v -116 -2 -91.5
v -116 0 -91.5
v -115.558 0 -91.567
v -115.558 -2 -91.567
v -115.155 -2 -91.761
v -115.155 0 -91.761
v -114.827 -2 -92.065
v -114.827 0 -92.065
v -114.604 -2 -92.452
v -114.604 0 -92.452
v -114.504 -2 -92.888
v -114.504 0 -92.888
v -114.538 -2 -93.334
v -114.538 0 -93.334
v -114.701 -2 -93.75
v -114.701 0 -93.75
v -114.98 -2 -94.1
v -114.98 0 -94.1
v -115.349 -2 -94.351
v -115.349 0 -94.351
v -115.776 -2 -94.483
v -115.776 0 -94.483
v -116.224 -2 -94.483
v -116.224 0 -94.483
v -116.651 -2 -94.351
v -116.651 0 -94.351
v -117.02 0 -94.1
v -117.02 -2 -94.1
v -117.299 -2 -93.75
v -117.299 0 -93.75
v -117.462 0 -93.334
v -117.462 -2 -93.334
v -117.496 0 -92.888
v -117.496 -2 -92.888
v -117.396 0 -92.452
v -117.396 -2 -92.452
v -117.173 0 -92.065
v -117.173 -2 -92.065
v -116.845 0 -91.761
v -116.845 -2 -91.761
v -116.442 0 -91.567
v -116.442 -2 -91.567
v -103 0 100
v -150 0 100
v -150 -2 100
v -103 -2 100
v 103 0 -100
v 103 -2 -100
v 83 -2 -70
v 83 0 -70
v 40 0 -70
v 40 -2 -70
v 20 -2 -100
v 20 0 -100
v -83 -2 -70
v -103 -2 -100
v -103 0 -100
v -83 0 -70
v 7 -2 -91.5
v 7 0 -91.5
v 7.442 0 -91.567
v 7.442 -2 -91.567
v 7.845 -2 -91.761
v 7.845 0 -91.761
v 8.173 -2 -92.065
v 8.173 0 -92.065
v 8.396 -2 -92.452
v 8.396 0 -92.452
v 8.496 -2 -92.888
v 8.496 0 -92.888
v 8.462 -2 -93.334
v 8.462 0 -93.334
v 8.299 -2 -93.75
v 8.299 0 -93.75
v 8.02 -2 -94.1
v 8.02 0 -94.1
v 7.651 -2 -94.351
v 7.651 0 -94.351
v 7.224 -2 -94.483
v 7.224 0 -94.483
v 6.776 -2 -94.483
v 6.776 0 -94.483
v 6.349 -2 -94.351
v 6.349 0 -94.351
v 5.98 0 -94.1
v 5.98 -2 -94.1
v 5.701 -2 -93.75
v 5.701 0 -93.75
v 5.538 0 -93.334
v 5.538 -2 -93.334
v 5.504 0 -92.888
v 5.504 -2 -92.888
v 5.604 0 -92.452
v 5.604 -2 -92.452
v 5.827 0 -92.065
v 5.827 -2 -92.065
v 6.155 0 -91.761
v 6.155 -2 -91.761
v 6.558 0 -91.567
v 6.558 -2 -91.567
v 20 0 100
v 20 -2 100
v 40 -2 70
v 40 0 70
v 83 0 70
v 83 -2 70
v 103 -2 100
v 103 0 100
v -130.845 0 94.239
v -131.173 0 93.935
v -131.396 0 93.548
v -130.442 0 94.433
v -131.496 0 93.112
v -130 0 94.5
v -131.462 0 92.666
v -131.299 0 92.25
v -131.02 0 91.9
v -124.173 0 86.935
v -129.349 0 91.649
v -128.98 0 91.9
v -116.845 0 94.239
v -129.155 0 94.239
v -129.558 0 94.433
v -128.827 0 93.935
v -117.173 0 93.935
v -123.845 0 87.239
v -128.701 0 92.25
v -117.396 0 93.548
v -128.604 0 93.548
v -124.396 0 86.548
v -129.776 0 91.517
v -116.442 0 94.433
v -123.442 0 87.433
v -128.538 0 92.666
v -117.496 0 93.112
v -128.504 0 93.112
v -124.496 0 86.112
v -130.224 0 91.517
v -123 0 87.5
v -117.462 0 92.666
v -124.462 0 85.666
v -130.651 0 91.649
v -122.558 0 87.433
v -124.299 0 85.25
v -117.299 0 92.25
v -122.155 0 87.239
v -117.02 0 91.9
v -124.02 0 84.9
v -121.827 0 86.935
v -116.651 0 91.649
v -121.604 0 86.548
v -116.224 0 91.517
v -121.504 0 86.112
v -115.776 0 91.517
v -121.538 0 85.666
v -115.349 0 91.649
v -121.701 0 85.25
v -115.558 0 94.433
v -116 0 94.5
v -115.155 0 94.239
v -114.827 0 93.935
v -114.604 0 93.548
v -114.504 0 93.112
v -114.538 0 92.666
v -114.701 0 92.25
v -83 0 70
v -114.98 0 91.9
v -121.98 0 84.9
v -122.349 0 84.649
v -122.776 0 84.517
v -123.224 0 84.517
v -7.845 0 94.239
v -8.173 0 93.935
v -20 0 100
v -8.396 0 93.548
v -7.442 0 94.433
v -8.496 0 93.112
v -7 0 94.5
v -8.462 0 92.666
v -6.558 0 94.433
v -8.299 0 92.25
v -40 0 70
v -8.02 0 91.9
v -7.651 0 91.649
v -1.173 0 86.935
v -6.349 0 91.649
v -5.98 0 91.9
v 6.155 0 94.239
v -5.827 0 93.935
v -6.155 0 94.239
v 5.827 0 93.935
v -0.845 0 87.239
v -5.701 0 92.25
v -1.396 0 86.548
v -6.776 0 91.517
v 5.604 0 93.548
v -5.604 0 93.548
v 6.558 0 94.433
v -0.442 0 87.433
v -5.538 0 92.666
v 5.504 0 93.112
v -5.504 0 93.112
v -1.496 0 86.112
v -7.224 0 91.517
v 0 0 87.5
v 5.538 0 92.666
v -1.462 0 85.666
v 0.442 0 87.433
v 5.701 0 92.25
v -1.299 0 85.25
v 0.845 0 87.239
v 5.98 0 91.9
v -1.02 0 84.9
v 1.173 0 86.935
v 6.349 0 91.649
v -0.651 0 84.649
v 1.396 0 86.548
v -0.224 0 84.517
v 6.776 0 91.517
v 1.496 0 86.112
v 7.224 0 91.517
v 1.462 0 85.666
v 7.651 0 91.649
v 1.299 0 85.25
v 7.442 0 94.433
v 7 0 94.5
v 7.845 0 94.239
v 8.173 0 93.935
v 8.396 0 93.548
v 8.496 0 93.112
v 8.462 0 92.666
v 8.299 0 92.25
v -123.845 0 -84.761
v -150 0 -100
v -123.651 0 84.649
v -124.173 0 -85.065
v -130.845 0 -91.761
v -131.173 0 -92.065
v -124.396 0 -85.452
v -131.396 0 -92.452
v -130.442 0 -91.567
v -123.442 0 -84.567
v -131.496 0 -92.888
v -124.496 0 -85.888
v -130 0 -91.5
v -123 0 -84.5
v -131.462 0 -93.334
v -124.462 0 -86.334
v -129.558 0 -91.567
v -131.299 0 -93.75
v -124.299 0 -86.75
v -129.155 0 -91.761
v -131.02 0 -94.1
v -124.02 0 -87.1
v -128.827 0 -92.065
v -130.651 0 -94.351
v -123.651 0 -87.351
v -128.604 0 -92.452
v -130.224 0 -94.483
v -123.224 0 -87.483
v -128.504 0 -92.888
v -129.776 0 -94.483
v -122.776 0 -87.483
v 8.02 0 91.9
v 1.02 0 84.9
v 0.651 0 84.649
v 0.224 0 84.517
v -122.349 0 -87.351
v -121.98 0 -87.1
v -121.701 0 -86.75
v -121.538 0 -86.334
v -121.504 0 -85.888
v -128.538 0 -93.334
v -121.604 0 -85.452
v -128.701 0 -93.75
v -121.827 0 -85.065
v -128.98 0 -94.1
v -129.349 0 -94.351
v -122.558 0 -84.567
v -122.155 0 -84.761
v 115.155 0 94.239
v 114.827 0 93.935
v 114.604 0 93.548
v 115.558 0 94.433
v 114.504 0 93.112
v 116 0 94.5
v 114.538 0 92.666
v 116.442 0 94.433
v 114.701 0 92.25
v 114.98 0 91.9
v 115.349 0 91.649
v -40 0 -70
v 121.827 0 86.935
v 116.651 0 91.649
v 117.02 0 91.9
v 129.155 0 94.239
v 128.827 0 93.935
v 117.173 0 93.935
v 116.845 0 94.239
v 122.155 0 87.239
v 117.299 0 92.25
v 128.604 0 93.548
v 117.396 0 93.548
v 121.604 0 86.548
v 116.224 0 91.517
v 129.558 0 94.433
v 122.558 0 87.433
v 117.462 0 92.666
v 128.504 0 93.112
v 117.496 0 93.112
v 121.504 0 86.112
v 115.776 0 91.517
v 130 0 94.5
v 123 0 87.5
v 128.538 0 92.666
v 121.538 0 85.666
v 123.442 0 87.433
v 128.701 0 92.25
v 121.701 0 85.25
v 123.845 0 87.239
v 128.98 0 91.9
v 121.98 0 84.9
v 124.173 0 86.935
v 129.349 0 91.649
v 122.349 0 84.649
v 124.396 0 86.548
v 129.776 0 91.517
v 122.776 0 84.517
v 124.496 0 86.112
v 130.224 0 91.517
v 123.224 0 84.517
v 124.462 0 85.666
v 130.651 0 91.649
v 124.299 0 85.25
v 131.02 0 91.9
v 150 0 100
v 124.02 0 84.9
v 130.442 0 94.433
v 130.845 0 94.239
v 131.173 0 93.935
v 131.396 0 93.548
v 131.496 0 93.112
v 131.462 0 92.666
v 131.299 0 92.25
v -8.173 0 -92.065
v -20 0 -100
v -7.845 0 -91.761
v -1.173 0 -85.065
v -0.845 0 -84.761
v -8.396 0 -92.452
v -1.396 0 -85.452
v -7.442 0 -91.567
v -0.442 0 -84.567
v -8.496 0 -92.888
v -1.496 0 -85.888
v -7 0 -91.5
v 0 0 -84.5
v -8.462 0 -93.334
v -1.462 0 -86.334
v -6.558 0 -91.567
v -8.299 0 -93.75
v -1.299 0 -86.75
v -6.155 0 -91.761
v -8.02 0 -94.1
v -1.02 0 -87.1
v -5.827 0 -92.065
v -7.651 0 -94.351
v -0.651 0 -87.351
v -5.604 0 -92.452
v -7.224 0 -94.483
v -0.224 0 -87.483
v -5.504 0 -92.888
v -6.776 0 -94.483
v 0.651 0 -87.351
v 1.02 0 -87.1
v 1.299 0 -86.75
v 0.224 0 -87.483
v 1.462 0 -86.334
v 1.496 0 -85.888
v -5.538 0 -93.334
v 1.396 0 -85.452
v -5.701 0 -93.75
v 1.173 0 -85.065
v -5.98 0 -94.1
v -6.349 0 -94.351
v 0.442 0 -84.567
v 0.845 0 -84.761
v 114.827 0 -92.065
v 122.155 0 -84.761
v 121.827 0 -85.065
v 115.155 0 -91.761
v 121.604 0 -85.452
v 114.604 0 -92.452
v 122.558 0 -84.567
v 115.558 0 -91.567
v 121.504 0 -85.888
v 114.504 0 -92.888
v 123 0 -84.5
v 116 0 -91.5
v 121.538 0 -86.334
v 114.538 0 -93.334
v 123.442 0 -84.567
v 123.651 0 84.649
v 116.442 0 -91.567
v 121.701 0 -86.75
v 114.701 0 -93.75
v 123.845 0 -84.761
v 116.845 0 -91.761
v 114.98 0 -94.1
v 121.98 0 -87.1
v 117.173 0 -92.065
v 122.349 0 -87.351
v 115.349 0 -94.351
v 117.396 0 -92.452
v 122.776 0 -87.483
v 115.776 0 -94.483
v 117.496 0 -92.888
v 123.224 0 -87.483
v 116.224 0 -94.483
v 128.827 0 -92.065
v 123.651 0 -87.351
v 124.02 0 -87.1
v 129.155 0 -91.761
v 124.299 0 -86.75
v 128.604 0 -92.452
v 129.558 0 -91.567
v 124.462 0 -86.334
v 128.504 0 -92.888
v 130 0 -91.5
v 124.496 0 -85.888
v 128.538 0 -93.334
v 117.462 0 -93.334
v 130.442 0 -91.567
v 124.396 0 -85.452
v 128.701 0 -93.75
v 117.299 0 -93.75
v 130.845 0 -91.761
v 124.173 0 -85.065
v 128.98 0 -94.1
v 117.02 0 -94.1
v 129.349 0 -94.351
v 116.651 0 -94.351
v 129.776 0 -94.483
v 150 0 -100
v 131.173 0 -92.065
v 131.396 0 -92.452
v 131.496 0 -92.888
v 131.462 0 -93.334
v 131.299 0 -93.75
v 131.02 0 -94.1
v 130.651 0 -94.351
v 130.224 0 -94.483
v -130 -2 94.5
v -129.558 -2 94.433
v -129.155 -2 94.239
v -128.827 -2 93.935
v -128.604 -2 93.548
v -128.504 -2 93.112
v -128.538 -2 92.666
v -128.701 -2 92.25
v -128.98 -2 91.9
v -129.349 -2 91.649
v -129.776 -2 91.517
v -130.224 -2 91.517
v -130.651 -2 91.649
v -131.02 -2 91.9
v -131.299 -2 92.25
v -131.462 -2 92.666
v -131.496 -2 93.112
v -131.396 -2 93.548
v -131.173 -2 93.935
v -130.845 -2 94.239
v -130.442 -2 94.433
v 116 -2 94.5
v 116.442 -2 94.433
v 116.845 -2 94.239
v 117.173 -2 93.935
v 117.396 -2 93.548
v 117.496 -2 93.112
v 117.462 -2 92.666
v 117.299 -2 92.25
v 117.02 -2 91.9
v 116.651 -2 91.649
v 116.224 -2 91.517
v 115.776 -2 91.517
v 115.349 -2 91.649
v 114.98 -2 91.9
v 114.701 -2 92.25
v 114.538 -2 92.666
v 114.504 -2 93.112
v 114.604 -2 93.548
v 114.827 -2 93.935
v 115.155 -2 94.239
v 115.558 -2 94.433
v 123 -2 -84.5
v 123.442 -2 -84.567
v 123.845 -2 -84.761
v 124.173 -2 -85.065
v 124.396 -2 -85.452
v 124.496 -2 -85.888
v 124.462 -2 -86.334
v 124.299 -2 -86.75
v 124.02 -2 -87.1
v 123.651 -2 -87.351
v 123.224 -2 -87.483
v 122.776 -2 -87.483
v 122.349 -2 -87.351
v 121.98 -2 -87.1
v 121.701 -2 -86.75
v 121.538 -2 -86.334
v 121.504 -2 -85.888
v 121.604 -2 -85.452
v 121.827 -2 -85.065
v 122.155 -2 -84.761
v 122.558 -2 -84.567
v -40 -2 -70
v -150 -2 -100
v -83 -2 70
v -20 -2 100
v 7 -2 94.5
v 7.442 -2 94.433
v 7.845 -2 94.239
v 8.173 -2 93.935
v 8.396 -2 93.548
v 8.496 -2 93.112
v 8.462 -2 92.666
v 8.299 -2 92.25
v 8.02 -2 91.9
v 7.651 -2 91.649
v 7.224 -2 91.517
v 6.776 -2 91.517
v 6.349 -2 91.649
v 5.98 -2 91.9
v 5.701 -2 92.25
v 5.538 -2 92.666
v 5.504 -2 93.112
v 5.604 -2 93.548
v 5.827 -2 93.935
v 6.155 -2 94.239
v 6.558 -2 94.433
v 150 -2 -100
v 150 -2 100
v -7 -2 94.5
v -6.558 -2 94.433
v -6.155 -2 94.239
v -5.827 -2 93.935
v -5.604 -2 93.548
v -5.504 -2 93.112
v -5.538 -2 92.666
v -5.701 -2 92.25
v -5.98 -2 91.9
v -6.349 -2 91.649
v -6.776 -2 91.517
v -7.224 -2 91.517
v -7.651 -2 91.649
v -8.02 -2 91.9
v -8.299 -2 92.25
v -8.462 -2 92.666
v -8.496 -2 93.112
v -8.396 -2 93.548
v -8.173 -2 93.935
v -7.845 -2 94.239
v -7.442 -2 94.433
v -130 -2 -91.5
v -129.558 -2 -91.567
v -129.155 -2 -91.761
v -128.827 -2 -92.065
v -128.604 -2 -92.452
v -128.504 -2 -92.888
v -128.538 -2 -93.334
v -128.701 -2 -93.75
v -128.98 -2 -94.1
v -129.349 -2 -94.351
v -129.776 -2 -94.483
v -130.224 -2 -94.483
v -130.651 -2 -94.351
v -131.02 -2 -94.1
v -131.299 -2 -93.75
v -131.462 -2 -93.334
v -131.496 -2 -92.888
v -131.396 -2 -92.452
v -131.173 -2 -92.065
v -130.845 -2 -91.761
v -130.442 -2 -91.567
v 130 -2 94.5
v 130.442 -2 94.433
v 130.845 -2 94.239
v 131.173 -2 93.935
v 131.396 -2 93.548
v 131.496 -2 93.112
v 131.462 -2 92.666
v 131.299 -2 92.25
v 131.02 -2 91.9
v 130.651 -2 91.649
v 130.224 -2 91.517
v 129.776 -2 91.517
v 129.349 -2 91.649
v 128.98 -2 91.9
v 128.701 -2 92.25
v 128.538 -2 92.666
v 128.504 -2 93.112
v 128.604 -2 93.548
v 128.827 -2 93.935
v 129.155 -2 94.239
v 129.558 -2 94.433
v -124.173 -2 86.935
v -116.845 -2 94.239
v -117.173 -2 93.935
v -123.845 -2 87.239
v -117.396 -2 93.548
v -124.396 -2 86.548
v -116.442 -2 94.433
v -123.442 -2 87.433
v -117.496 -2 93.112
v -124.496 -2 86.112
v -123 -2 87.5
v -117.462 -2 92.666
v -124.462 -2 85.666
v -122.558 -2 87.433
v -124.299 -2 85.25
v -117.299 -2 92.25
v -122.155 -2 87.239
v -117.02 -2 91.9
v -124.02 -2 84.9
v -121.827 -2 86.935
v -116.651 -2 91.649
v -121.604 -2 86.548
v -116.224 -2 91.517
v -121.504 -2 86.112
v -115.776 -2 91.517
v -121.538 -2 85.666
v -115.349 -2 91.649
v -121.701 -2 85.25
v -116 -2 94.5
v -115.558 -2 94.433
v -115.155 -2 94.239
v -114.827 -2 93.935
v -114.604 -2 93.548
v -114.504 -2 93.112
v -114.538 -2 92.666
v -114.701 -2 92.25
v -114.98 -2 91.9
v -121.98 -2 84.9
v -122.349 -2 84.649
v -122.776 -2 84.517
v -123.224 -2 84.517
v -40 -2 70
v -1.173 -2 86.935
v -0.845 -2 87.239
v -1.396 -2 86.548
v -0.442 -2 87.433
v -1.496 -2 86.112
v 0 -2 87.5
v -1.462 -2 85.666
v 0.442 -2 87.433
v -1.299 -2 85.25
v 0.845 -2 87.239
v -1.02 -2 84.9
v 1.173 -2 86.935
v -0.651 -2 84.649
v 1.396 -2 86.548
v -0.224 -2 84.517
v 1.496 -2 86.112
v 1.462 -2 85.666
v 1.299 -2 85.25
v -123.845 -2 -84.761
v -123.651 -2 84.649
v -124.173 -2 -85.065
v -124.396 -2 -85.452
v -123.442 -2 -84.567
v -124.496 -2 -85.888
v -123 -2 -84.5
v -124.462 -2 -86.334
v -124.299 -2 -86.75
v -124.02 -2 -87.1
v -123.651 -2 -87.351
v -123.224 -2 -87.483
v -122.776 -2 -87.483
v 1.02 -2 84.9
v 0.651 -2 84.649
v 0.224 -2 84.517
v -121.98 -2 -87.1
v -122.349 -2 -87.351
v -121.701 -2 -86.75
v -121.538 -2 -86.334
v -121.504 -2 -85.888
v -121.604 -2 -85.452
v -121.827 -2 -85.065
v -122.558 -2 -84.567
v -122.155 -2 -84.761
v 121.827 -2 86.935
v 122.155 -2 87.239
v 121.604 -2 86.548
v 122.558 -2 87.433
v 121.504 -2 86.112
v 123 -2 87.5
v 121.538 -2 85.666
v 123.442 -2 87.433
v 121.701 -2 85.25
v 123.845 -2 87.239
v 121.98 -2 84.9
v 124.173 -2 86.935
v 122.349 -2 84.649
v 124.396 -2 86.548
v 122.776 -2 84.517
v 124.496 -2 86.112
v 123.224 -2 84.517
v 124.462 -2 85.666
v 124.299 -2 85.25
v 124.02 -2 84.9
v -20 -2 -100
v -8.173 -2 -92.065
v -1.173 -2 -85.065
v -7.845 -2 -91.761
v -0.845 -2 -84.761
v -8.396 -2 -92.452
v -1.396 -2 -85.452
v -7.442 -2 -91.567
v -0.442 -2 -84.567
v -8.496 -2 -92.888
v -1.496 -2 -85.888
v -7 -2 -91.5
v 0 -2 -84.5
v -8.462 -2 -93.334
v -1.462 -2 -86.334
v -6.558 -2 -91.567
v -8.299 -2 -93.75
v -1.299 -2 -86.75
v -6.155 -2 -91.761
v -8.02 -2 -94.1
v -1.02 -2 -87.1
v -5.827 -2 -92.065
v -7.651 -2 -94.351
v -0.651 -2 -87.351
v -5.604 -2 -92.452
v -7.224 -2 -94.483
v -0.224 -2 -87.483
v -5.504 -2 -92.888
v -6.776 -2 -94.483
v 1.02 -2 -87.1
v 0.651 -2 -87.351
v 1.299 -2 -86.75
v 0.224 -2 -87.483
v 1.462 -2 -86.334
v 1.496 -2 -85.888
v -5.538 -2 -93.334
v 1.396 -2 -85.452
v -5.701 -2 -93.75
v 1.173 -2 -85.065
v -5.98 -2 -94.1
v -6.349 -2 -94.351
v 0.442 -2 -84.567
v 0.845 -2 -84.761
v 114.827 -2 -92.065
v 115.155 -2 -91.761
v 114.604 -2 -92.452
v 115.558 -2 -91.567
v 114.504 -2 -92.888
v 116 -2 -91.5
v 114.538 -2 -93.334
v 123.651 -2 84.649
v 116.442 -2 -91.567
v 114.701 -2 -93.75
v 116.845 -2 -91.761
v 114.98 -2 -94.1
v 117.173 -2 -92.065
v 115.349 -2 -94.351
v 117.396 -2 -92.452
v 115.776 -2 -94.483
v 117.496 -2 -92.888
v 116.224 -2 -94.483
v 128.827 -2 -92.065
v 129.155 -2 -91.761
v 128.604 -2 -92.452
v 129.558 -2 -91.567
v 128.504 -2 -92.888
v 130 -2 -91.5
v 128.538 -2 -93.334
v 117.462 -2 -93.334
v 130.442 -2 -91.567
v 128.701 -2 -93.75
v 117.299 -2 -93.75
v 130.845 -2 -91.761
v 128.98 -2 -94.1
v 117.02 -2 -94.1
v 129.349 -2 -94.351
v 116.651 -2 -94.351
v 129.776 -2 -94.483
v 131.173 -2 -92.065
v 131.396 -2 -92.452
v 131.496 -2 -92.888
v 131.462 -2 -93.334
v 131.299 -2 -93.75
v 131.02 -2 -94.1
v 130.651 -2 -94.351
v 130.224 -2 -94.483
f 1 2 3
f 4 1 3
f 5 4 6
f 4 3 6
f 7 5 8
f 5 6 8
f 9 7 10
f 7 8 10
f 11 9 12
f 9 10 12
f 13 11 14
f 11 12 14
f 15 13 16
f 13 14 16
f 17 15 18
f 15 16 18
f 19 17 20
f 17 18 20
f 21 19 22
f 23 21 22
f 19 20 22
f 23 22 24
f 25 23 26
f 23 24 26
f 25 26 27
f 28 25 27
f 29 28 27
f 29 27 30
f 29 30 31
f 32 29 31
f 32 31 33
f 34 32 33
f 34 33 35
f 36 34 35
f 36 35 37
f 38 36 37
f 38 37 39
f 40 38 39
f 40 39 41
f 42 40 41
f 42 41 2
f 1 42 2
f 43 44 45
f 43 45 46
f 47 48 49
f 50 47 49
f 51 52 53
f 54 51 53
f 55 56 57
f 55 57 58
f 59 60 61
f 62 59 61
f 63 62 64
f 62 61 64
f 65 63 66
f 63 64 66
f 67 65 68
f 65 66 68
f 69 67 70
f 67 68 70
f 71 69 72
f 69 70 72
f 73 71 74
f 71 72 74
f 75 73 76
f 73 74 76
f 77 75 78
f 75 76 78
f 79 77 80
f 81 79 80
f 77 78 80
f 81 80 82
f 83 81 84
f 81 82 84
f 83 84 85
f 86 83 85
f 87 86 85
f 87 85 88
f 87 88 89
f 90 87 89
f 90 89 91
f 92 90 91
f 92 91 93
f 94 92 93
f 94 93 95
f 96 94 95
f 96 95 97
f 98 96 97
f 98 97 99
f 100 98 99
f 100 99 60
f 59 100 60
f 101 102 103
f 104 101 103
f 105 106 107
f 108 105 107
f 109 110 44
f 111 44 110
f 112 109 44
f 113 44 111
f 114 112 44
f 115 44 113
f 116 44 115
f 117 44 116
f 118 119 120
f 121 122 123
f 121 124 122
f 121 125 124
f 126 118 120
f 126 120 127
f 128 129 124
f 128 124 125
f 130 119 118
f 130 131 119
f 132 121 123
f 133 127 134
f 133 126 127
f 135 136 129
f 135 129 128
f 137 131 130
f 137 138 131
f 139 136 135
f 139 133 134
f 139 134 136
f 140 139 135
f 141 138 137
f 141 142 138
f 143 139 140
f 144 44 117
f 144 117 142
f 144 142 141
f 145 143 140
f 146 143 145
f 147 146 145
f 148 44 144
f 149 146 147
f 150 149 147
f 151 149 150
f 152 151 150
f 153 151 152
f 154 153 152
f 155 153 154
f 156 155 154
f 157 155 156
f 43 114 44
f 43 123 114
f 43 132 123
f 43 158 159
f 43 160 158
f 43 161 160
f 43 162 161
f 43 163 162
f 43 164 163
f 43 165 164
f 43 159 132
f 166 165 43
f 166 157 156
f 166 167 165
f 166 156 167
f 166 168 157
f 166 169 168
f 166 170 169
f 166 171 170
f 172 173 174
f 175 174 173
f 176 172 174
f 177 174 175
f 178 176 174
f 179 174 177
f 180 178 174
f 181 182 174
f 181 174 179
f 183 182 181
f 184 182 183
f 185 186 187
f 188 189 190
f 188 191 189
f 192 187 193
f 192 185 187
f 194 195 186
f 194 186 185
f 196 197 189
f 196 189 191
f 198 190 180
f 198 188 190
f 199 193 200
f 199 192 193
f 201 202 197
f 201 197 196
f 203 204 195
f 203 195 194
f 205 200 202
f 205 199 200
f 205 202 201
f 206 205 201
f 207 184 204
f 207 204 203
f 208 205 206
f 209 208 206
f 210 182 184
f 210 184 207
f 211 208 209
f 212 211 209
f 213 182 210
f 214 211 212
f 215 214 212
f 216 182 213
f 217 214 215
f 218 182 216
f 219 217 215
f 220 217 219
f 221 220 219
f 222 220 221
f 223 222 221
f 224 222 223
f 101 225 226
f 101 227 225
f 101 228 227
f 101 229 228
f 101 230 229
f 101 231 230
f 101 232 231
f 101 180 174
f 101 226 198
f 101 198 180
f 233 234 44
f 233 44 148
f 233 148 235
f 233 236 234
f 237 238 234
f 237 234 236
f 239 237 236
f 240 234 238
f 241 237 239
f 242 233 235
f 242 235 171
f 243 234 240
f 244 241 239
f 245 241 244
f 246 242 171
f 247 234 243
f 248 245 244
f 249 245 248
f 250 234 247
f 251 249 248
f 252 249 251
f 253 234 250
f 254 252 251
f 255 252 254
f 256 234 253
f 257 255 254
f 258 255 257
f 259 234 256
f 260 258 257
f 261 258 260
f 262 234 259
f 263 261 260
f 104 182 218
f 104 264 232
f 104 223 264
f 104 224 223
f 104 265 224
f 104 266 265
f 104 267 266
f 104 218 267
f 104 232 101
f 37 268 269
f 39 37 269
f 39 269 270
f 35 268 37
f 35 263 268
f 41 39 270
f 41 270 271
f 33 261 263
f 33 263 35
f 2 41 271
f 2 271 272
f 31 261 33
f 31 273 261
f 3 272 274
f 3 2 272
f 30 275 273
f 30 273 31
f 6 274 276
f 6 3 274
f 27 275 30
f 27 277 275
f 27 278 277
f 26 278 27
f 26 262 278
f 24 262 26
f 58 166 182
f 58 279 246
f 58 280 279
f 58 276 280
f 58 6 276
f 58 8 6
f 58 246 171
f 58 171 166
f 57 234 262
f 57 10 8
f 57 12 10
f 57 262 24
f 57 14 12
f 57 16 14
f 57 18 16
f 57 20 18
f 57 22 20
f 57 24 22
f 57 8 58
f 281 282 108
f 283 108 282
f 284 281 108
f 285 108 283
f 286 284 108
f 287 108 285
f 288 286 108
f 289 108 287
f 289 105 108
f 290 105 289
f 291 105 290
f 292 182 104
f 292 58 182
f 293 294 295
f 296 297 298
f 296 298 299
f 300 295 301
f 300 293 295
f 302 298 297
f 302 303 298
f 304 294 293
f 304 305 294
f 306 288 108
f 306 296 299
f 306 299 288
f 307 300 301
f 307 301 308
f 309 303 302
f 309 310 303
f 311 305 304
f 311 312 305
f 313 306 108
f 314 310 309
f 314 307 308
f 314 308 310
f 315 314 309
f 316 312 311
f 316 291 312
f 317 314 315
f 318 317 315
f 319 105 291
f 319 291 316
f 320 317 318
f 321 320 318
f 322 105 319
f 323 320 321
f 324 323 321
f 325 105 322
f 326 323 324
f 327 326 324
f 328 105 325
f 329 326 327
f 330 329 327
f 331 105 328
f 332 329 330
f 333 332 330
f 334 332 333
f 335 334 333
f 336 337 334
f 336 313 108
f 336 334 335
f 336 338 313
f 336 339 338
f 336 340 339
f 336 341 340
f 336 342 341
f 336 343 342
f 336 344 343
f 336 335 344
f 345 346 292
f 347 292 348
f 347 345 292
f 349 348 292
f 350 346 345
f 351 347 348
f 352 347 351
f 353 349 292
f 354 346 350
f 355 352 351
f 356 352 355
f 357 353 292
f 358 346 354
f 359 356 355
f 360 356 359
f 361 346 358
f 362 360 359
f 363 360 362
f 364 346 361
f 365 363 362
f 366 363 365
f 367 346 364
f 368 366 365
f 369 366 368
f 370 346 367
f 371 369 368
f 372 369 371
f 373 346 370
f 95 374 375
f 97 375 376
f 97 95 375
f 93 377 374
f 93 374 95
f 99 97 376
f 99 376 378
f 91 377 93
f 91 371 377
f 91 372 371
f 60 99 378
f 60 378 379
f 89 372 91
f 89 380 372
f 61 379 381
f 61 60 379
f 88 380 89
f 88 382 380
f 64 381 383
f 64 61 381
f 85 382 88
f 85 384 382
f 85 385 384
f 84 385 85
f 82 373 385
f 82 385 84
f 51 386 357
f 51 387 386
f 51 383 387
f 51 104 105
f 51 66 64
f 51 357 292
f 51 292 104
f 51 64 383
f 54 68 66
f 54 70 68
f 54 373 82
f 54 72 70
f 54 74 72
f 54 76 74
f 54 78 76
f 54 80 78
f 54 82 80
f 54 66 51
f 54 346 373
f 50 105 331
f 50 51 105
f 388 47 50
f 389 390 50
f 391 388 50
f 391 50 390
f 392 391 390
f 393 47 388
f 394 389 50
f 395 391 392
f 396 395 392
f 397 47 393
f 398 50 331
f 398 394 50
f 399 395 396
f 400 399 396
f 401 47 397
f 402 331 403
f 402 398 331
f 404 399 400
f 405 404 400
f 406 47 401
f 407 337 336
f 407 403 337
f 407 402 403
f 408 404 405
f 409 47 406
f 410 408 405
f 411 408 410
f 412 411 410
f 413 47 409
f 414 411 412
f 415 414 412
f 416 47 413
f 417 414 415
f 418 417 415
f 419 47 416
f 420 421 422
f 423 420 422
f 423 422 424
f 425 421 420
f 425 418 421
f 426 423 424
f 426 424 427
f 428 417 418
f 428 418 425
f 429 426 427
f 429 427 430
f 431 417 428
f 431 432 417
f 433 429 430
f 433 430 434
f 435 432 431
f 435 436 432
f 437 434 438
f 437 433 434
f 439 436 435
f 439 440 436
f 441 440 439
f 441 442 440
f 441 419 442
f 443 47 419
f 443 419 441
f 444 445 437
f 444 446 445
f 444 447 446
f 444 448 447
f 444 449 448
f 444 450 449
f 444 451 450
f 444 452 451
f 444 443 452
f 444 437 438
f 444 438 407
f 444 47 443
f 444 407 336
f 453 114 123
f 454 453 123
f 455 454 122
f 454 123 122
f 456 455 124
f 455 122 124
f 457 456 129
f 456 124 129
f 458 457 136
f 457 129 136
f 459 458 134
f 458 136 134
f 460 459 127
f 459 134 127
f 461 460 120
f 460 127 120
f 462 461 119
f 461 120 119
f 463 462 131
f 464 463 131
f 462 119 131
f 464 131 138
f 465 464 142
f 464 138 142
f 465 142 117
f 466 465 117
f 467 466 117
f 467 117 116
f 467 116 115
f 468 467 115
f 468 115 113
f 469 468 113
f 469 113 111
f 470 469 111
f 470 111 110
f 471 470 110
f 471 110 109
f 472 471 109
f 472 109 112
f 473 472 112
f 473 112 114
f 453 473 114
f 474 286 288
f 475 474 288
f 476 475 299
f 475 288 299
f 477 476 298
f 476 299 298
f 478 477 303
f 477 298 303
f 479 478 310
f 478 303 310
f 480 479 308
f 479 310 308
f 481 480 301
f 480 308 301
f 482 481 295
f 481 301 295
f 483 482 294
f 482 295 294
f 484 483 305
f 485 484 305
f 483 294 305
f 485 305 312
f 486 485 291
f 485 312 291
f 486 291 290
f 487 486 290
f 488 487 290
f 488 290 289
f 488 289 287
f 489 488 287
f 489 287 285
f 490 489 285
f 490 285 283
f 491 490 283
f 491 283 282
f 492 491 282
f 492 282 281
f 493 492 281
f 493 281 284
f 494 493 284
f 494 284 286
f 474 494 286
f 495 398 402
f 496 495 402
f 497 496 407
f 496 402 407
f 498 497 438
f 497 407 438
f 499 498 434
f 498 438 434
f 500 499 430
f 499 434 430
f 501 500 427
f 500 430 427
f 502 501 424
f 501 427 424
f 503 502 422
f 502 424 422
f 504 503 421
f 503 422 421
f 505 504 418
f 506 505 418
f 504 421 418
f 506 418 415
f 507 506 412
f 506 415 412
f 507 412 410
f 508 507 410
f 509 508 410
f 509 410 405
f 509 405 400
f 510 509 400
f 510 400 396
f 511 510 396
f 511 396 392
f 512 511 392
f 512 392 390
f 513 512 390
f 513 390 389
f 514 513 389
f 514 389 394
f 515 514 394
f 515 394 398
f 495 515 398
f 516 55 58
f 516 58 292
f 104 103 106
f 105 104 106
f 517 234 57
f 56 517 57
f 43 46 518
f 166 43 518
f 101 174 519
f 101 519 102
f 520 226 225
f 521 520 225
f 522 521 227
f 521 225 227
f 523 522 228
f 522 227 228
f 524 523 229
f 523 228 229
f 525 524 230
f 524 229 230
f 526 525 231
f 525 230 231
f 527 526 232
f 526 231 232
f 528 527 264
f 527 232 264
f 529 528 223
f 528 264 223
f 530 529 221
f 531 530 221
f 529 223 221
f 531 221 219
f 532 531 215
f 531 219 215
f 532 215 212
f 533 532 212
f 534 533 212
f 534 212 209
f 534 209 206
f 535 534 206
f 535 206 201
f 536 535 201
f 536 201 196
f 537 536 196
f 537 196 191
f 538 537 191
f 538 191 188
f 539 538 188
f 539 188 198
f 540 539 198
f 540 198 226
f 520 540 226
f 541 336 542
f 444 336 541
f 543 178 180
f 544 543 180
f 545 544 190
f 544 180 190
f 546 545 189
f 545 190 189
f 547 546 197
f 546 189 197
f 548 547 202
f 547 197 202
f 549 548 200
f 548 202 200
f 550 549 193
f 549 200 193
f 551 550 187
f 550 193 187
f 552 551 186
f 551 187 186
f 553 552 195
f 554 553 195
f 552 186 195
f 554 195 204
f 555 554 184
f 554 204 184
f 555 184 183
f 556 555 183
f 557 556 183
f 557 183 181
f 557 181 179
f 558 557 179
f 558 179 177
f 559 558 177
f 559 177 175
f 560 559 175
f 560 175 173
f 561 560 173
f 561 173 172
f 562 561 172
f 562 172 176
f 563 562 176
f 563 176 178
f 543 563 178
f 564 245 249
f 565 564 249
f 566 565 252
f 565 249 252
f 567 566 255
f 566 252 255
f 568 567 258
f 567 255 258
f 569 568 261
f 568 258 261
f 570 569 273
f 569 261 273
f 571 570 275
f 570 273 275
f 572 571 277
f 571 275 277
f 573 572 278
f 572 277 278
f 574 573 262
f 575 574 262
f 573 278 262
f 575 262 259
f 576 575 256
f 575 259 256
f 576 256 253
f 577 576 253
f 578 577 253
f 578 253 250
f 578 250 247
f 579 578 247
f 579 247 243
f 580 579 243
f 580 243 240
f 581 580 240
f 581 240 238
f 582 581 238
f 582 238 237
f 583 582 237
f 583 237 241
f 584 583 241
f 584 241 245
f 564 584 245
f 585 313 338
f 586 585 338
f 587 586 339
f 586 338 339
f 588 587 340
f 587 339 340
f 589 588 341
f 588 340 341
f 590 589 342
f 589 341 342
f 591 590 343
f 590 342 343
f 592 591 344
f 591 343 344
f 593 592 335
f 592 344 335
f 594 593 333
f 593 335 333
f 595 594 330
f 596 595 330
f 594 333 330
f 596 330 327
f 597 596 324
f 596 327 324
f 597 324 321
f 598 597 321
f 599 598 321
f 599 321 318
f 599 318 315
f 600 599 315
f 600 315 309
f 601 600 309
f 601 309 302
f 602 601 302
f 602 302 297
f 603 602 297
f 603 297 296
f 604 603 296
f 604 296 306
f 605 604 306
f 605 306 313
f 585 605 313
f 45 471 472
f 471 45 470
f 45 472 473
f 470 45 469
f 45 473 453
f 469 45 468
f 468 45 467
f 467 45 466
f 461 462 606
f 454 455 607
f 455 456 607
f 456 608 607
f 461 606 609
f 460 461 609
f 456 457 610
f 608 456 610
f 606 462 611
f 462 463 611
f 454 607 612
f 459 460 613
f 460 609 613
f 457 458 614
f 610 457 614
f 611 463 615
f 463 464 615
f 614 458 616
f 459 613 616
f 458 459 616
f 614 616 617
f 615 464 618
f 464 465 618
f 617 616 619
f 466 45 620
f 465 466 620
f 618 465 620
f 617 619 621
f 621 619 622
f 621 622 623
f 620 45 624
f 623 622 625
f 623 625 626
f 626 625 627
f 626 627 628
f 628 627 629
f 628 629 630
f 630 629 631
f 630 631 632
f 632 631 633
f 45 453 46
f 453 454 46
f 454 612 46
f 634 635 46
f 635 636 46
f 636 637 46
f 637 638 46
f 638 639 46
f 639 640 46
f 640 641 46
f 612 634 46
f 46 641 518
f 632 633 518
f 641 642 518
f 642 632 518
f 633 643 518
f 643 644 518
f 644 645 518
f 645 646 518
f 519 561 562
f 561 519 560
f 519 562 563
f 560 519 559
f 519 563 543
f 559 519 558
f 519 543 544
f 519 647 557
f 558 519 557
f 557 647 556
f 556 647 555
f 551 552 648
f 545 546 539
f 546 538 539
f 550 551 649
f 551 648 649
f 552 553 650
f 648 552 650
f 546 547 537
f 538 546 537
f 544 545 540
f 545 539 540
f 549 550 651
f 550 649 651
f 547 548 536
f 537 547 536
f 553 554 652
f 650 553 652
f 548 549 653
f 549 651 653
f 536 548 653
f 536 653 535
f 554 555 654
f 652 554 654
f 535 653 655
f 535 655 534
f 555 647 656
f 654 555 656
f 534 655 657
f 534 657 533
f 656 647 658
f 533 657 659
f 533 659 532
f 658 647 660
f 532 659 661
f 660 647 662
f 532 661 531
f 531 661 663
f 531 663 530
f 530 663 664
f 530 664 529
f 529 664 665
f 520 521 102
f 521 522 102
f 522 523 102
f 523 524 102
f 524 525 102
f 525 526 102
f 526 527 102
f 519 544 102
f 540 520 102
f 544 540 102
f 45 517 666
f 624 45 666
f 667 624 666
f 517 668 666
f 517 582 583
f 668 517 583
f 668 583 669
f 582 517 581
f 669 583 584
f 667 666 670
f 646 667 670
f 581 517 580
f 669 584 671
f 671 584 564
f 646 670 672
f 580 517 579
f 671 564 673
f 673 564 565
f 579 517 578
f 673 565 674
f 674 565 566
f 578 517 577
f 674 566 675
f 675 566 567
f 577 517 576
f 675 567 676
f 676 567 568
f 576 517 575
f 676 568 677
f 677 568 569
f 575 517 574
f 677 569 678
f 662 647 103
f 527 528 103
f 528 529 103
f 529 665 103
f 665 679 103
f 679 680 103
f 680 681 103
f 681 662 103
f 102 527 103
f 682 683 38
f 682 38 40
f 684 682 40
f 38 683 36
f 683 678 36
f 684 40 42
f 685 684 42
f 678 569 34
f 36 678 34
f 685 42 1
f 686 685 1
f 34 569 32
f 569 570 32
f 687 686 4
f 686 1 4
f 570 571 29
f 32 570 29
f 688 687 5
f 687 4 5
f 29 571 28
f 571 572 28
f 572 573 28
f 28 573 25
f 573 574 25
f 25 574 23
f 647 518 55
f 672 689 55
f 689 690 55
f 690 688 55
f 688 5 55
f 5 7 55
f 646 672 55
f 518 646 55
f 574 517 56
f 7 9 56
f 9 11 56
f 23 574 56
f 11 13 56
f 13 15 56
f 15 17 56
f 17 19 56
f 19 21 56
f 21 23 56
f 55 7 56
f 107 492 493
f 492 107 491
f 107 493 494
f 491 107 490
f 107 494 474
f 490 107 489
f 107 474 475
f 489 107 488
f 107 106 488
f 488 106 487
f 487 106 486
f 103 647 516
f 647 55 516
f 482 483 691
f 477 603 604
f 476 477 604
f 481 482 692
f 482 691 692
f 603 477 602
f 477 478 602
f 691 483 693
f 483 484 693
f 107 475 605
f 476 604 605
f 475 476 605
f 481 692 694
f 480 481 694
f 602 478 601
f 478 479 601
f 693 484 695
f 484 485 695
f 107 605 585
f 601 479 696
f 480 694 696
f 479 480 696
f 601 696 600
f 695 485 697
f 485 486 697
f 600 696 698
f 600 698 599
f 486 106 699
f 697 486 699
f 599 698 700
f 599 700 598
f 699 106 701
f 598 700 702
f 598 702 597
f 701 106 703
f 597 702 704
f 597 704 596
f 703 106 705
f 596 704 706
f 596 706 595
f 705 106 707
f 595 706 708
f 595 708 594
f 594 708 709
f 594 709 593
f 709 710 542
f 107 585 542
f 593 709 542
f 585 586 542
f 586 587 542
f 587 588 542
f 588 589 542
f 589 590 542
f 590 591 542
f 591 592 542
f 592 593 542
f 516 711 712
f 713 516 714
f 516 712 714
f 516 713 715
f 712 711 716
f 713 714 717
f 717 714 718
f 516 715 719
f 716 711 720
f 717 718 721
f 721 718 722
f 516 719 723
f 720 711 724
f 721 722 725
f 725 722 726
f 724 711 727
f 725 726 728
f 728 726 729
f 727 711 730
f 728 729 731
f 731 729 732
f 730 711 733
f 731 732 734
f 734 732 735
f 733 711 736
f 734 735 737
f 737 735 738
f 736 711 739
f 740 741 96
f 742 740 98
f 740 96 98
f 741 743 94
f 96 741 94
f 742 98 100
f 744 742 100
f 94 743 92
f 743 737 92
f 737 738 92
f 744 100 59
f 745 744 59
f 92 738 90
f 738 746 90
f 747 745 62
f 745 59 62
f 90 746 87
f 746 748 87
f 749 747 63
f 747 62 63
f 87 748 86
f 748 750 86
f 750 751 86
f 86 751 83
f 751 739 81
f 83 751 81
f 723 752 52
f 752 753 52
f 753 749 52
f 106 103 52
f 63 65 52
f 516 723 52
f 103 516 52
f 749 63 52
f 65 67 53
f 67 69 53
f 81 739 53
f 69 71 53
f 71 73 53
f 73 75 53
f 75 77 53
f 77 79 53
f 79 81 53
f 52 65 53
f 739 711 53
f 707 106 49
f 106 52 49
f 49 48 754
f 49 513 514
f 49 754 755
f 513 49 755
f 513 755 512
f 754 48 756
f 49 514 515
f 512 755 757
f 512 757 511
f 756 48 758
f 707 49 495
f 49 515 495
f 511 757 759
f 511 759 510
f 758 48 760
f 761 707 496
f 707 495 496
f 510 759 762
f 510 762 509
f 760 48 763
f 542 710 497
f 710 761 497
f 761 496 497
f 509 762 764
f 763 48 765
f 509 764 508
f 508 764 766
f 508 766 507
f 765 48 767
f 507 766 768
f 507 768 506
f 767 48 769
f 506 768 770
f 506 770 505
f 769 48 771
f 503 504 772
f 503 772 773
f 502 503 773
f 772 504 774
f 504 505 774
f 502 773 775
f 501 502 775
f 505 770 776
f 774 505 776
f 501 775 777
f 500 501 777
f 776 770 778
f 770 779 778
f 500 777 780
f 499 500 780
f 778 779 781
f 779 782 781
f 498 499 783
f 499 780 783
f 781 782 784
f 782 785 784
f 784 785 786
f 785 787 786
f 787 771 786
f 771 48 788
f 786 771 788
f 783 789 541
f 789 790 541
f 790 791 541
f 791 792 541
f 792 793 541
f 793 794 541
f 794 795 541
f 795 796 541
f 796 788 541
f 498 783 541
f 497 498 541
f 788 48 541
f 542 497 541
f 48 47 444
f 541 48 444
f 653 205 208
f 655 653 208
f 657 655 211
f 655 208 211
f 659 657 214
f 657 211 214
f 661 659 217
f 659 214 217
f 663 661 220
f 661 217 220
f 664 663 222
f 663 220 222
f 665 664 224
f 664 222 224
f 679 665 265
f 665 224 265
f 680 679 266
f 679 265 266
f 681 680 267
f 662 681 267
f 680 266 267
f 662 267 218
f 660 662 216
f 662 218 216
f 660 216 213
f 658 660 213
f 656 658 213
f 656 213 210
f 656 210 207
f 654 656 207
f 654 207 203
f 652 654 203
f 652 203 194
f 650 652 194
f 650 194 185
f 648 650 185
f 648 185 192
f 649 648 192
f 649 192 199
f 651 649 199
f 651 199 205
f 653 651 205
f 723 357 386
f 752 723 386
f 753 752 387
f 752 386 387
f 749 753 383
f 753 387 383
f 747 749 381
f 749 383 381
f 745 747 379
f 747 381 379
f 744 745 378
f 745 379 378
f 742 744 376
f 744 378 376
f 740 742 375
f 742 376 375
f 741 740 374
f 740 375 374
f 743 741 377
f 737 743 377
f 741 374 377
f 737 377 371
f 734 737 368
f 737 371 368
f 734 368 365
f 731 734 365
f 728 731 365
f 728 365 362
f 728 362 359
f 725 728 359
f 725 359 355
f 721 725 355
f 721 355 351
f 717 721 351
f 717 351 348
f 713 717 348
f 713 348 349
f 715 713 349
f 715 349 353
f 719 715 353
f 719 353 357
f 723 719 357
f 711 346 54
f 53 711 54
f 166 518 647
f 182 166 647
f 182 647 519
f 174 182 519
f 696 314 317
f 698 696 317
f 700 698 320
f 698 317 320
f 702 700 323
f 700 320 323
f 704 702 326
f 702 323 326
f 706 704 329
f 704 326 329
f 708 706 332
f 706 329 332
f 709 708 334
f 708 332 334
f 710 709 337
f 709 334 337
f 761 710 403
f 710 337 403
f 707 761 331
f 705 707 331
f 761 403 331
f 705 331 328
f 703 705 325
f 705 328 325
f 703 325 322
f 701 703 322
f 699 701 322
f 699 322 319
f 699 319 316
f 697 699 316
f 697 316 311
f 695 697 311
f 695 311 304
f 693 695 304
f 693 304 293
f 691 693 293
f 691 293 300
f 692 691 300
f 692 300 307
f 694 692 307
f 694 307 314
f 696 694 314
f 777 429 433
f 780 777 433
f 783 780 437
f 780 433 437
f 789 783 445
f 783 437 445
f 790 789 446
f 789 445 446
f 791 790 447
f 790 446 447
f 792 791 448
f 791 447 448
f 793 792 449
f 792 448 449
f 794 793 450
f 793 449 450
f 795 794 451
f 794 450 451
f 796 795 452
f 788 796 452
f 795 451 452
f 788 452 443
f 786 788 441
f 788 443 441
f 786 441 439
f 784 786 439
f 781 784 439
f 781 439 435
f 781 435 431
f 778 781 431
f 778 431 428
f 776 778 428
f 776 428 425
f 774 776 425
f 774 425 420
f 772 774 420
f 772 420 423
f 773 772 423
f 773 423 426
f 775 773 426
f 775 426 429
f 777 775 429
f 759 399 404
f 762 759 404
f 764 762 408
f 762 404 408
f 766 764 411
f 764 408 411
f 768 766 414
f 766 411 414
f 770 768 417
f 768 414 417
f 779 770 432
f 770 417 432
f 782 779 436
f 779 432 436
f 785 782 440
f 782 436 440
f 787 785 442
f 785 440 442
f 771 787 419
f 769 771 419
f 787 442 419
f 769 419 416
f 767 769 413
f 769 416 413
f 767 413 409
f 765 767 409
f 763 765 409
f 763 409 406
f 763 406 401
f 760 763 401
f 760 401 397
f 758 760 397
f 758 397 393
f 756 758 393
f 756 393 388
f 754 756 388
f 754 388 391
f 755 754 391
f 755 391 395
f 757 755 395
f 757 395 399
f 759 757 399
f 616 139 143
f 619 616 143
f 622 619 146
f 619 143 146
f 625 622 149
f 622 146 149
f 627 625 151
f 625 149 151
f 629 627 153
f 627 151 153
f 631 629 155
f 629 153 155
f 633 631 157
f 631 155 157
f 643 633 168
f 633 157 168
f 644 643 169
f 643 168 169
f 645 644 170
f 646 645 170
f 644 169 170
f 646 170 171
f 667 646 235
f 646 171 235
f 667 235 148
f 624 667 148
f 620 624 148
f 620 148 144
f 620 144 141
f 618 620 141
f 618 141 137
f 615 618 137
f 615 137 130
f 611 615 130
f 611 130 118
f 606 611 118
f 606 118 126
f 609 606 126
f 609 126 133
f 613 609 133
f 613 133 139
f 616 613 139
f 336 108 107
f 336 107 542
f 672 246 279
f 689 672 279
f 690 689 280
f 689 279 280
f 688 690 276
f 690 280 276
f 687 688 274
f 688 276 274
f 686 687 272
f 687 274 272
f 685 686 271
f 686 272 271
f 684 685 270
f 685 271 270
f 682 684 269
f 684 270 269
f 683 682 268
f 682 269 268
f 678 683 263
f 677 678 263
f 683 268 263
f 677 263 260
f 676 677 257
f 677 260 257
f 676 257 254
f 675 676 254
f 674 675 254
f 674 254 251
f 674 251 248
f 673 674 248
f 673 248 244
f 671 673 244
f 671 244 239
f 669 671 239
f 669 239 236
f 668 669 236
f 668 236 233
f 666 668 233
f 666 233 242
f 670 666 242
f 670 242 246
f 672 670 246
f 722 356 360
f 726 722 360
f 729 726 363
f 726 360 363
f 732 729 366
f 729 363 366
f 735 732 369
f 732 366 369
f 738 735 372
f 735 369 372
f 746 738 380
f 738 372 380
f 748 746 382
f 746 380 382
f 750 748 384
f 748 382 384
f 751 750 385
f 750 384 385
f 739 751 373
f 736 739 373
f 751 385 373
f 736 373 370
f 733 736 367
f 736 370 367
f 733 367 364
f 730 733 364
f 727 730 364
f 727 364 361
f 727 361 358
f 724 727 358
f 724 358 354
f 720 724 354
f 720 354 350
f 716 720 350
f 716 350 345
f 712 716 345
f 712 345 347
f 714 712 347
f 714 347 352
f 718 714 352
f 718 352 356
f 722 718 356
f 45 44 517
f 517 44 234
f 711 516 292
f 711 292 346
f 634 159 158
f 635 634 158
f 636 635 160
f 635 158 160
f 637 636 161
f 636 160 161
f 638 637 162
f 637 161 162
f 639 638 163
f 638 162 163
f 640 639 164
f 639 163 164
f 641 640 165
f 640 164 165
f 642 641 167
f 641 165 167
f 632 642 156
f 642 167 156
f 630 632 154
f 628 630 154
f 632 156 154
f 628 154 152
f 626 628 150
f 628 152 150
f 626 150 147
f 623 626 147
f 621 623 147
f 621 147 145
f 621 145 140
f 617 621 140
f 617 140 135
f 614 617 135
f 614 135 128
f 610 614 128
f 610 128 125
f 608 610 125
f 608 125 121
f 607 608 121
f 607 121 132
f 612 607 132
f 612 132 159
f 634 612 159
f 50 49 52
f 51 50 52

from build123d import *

# Parameters (mm, degrees)
SZKIC1_W                    = 300
SZKIC1_H                    = 200
DODANIE_WYCI_GNI_CIE1_DEPTH = 2
WYTNIJ_WYCI_GNI_CIE1_REACH  = 182.289
SZKIC2_R                    = 1.5
WYTNIJ_WYCI_GNI_CIE2_DEPTH  = 2


with BuildPart() as part:
    # Szkic1 → Dodanie-wyciągnięcie1 (new body)
    with BuildSketch(Plane(origin=(0, 0, 0), x_dir=(1, 0, 0), z_dir=(0, 1, 0))):
        Rectangle(SZKIC1_W, SZKIC1_H)
    extrude(amount=-DODANIE_WYCI_GNI_CIE1_DEPTH)

    # Szkic2 → Wytnij-wyciągnięcie1 (cut, up to next)
    with BuildSketch(Plane(origin=(0, 0, 0), x_dir=(1, 0, 0), z_dir=(0, 1, 0)), mode=Mode.PRIVATE) as wytnij_wyci_gni_cie1_sk1:
        with Locations(Location((0, -86, 0), (0, 0, 270))):
            Circle(SZKIC2_R)
    wytnij_wyci_gni_cie1_tool1 = extrude(wytnij_wyci_gni_cie1_sk1.sketch, amount=-WYTNIJ_WYCI_GNI_CIE1_REACH, mode=Mode.PRIVATE) & part.part
    # Szkic2 → Wytnij-wyciągnięcie1 (cut, up to next)
    with BuildSketch(Plane(origin=(0, 0, 0), x_dir=(1, 0, 0), z_dir=(0, 1, 0)), mode=Mode.PRIVATE) as wytnij_wyci_gni_cie1_sk2:
        with Locations(Location((-7, -93, 0), (0, 0, 270))):
            Circle(SZKIC2_R)
    wytnij_wyci_gni_cie1_tool2 = extrude(wytnij_wyci_gni_cie1_sk2.sketch, amount=-WYTNIJ_WYCI_GNI_CIE1_REACH, mode=Mode.PRIVATE) & part.part
    # Szkic2 → Wytnij-wyciągnięcie1 (cut, up to next)
    with BuildSketch(Plane(origin=(0, 0, 0), x_dir=(1, 0, 0), z_dir=(0, 1, 0)), mode=Mode.PRIVATE) as wytnij_wyci_gni_cie1_sk3:
        with Locations(Location((7, -93, 0), (0, 0, 270))):
            Circle(SZKIC2_R)
    wytnij_wyci_gni_cie1_tool3 = extrude(wytnij_wyci_gni_cie1_sk3.sketch, amount=-WYTNIJ_WYCI_GNI_CIE1_REACH, mode=Mode.PRIVATE) & part.part
    # Szkic2 → Wytnij-wyciągnięcie1 (cut, up to next)
    with BuildSketch(Plane(origin=(0, 0, 0), x_dir=(1, 0, 0), z_dir=(0, 1, 0)), mode=Mode.PRIVATE) as wytnij_wyci_gni_cie1_sk4:
        with Locations(Location((-123, -86, 0), (0, 0, 270))):
            Circle(SZKIC2_R)
    wytnij_wyci_gni_cie1_tool4 = extrude(wytnij_wyci_gni_cie1_sk4.sketch, amount=-WYTNIJ_WYCI_GNI_CIE1_REACH, mode=Mode.PRIVATE) & part.part
    # Szkic2 → Wytnij-wyciągnięcie1 (cut, up to next)
    with BuildSketch(Plane(origin=(0, 0, 0), x_dir=(1, 0, 0), z_dir=(0, 1, 0)), mode=Mode.PRIVATE) as wytnij_wyci_gni_cie1_sk5:
        with Locations(Location((-130, -93, 0), (0, 0, 270))):
            Circle(SZKIC2_R)
    wytnij_wyci_gni_cie1_tool5 = extrude(wytnij_wyci_gni_cie1_sk5.sketch, amount=-WYTNIJ_WYCI_GNI_CIE1_REACH, mode=Mode.PRIVATE) & part.part
    # Szkic2 → Wytnij-wyciągnięcie1 (cut, up to next)
    with BuildSketch(Plane(origin=(0, 0, 0), x_dir=(1, 0, 0), z_dir=(0, 1, 0)), mode=Mode.PRIVATE) as wytnij_wyci_gni_cie1_sk6:
        with Locations(Location((-116, -93, 0), (0, 0, 270))):
            Circle(SZKIC2_R)
    wytnij_wyci_gni_cie1_tool6 = extrude(wytnij_wyci_gni_cie1_sk6.sketch, amount=-WYTNIJ_WYCI_GNI_CIE1_REACH, mode=Mode.PRIVATE) & part.part
    # Szkic2 → Wytnij-wyciągnięcie1 (cut, up to next)
    with BuildSketch(Plane(origin=(0, 0, 0), x_dir=(1, 0, 0), z_dir=(0, 1, 0)), mode=Mode.PRIVATE) as wytnij_wyci_gni_cie1_sk7:
        with Locations(Location((130, -93, 0), (0, 0, 270))):
            Circle(SZKIC2_R)
    wytnij_wyci_gni_cie1_tool7 = extrude(wytnij_wyci_gni_cie1_sk7.sketch, amount=-WYTNIJ_WYCI_GNI_CIE1_REACH, mode=Mode.PRIVATE) & part.part
    # Szkic2 → Wytnij-wyciągnięcie1 (cut, up to next)
    with BuildSketch(Plane(origin=(0, 0, 0), x_dir=(1, 0, 0), z_dir=(0, 1, 0)), mode=Mode.PRIVATE) as wytnij_wyci_gni_cie1_sk8:
        with Locations(Location((123, -86, 0), (0, 0, 270))):
            Circle(SZKIC2_R)
    wytnij_wyci_gni_cie1_tool8 = extrude(wytnij_wyci_gni_cie1_sk8.sketch, amount=-WYTNIJ_WYCI_GNI_CIE1_REACH, mode=Mode.PRIVATE) & part.part
    # Szkic2 → Wytnij-wyciągnięcie1 (cut, up to next)
    with BuildSketch(Plane(origin=(0, 0, 0), x_dir=(1, 0, 0), z_dir=(0, 1, 0)), mode=Mode.PRIVATE) as wytnij_wyci_gni_cie1_sk9:
        with Locations(Location((116, -93, 0), (0, 0, 270))):
            Circle(SZKIC2_R)
    wytnij_wyci_gni_cie1_tool9 = extrude(wytnij_wyci_gni_cie1_sk9.sketch, amount=-WYTNIJ_WYCI_GNI_CIE1_REACH, mode=Mode.PRIVATE) & part.part
    # Szkic2 → Wytnij-wyciągnięcie1 (cut, up to next)
    with BuildSketch(Plane(origin=(0, 0, 0), x_dir=(1, 0, 0), z_dir=(0, 1, 0)), mode=Mode.PRIVATE) as wytnij_wyci_gni_cie1_sk10:
        with Locations(Location((0, 86, 0), (0, 0, 270))):
            Circle(SZKIC2_R)
    wytnij_wyci_gni_cie1_tool10 = extrude(wytnij_wyci_gni_cie1_sk10.sketch, amount=-WYTNIJ_WYCI_GNI_CIE1_REACH, mode=Mode.PRIVATE) & part.part
    # Szkic2 → Wytnij-wyciągnięcie1 (cut, up to next)
    with BuildSketch(Plane(origin=(0, 0, 0), x_dir=(1, 0, 0), z_dir=(0, 1, 0)), mode=Mode.PRIVATE) as wytnij_wyci_gni_cie1_sk11:
        with Locations(Location((7, 93, 0), (0, 0, 270))):
            Circle(SZKIC2_R)
    wytnij_wyci_gni_cie1_tool11 = extrude(wytnij_wyci_gni_cie1_sk11.sketch, amount=-WYTNIJ_WYCI_GNI_CIE1_REACH, mode=Mode.PRIVATE) & part.part
    # Szkic2 → Wytnij-wyciągnięcie1 (cut, up to next)
    with BuildSketch(Plane(origin=(0, 0, 0), x_dir=(1, 0, 0), z_dir=(0, 1, 0)), mode=Mode.PRIVATE) as wytnij_wyci_gni_cie1_sk12:
        with Locations(Location((-7, 93, 0), (0, 0, 270))):
            Circle(SZKIC2_R)
    wytnij_wyci_gni_cie1_tool12 = extrude(wytnij_wyci_gni_cie1_sk12.sketch, amount=-WYTNIJ_WYCI_GNI_CIE1_REACH, mode=Mode.PRIVATE) & part.part
    # Szkic2 → Wytnij-wyciągnięcie1 (cut, up to next)
    with BuildSketch(Plane(origin=(0, 0, 0), x_dir=(1, 0, 0), z_dir=(0, 1, 0)), mode=Mode.PRIVATE) as wytnij_wyci_gni_cie1_sk13:
        with Locations(Location((130, 93, 0), (0, 0, 270))):
            Circle(SZKIC2_R)
    wytnij_wyci_gni_cie1_tool13 = extrude(wytnij_wyci_gni_cie1_sk13.sketch, amount=-WYTNIJ_WYCI_GNI_CIE1_REACH, mode=Mode.PRIVATE) & part.part
    # Szkic2 → Wytnij-wyciągnięcie1 (cut, up to next)
    with BuildSketch(Plane(origin=(0, 0, 0), x_dir=(1, 0, 0), z_dir=(0, 1, 0)), mode=Mode.PRIVATE) as wytnij_wyci_gni_cie1_sk14:
        with Locations(Location((123, 86, 0), (0, 0, 270))):
            Circle(SZKIC2_R)
    wytnij_wyci_gni_cie1_tool14 = extrude(wytnij_wyci_gni_cie1_sk14.sketch, amount=-WYTNIJ_WYCI_GNI_CIE1_REACH, mode=Mode.PRIVATE) & part.part
    # Szkic2 → Wytnij-wyciągnięcie1 (cut, up to next)
    with BuildSketch(Plane(origin=(0, 0, 0), x_dir=(1, 0, 0), z_dir=(0, 1, 0)), mode=Mode.PRIVATE) as wytnij_wyci_gni_cie1_sk15:
        with Locations(Location((116, 93, 0), (0, 0, 270))):
            Circle(SZKIC2_R)
    wytnij_wyci_gni_cie1_tool15 = extrude(wytnij_wyci_gni_cie1_sk15.sketch, amount=-WYTNIJ_WYCI_GNI_CIE1_REACH, mode=Mode.PRIVATE) & part.part
    # Szkic2 → Wytnij-wyciągnięcie1 (cut, up to next)
    with BuildSketch(Plane(origin=(0, 0, 0), x_dir=(1, 0, 0), z_dir=(0, 1, 0)), mode=Mode.PRIVATE) as wytnij_wyci_gni_cie1_sk16:
        with Locations(Location((-116, 93, 0), (0, 0, 270))):
            Circle(SZKIC2_R)
    wytnij_wyci_gni_cie1_tool16 = extrude(wytnij_wyci_gni_cie1_sk16.sketch, amount=-WYTNIJ_WYCI_GNI_CIE1_REACH, mode=Mode.PRIVATE) & part.part
    # Szkic2 → Wytnij-wyciągnięcie1 (cut, up to next)
    with BuildSketch(Plane(origin=(0, 0, 0), x_dir=(1, 0, 0), z_dir=(0, 1, 0)), mode=Mode.PRIVATE) as wytnij_wyci_gni_cie1_sk17:
        with Locations(Location((-123, 86, 0), (0, 0, 270))):
            Circle(SZKIC2_R)
    wytnij_wyci_gni_cie1_tool17 = extrude(wytnij_wyci_gni_cie1_sk17.sketch, amount=-WYTNIJ_WYCI_GNI_CIE1_REACH, mode=Mode.PRIVATE) & part.part
    # Szkic2 → Wytnij-wyciągnięcie1 (cut, up to next)
    with BuildSketch(Plane(origin=(0, 0, 0), x_dir=(1, 0, 0), z_dir=(0, 1, 0)), mode=Mode.PRIVATE) as wytnij_wyci_gni_cie1_sk18:
        with Locations(Location((-130, 93, 0), (0, 0, 270))):
            Circle(SZKIC2_R)
    wytnij_wyci_gni_cie1_tool18 = extrude(wytnij_wyci_gni_cie1_sk18.sketch, amount=-WYTNIJ_WYCI_GNI_CIE1_REACH, mode=Mode.PRIVATE) & part.part
    add(wytnij_wyci_gni_cie1_tool1.solids().sort_by_distance((0, 0, 86))[0], mode=Mode.SUBTRACT)
    add(wytnij_wyci_gni_cie1_tool2.solids().sort_by_distance((-7, 0, 93))[0], mode=Mode.SUBTRACT)
    add(wytnij_wyci_gni_cie1_tool3.solids().sort_by_distance((7, 0, 93))[0], mode=Mode.SUBTRACT)
    add(wytnij_wyci_gni_cie1_tool4.solids().sort_by_distance((-123, 0, 86))[0], mode=Mode.SUBTRACT)
    add(wytnij_wyci_gni_cie1_tool5.solids().sort_by_distance((-130, 0, 93))[0], mode=Mode.SUBTRACT)
    add(wytnij_wyci_gni_cie1_tool6.solids().sort_by_distance((-116, 0, 93))[0], mode=Mode.SUBTRACT)
    add(wytnij_wyci_gni_cie1_tool7.solids().sort_by_distance((130, 0, 93))[0], mode=Mode.SUBTRACT)
    add(wytnij_wyci_gni_cie1_tool8.solids().sort_by_distance((123, 0, 86))[0], mode=Mode.SUBTRACT)
    add(wytnij_wyci_gni_cie1_tool9.solids().sort_by_distance((116, 0, 93))[0], mode=Mode.SUBTRACT)
    add(wytnij_wyci_gni_cie1_tool10.solids().sort_by_distance((0, 0, -86))[0], mode=Mode.SUBTRACT)
    add(wytnij_wyci_gni_cie1_tool11.solids().sort_by_distance((7, 0, -93))[0], mode=Mode.SUBTRACT)
    add(wytnij_wyci_gni_cie1_tool12.solids().sort_by_distance((-7, 0, -93))[0], mode=Mode.SUBTRACT)
    add(wytnij_wyci_gni_cie1_tool13.solids().sort_by_distance((130, 0, -93))[0], mode=Mode.SUBTRACT)
    add(wytnij_wyci_gni_cie1_tool14.solids().sort_by_distance((123, 0, -86))[0], mode=Mode.SUBTRACT)
    add(wytnij_wyci_gni_cie1_tool15.solids().sort_by_distance((116, 0, -93))[0], mode=Mode.SUBTRACT)
    add(wytnij_wyci_gni_cie1_tool16.solids().sort_by_distance((-116, 0, -93))[0], mode=Mode.SUBTRACT)
    add(wytnij_wyci_gni_cie1_tool17.solids().sort_by_distance((-123, 0, -86))[0], mode=Mode.SUBTRACT)
    add(wytnij_wyci_gni_cie1_tool18.solids().sort_by_distance((-130, 0, -93))[0], mode=Mode.SUBTRACT)

    # Szkic3 → Wytnij-wyciągnięcie2 (cut)
    with BuildSketch(Plane.XZ.offset(2)):
        Polygon((-103, -100), (-83, -70), (-40, -70), (-20, -100), align=None)
        Polygon((103, -100), (83, -70), (40, -70), (20, -100), align=None)
        Polygon((103, 100), (20, 100), (40, 70), (83, 70), align=None)
        Polygon((-103, 100), (-83, 70), (-40, 70), (-20, 100), align=None)
    extrude(amount=-WYTNIJ_WYCI_GNI_CIE2_DEPTH, mode=Mode.SUBTRACT)


solid = part.part
